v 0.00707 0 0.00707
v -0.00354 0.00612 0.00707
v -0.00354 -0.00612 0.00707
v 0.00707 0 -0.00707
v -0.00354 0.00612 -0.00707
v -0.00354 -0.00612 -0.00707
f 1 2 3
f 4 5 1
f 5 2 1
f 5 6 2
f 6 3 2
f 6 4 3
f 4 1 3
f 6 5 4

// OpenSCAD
// file: ../scad/params.scad
// ===== Smart lock enclosure parameters (mm) =====

// --- Print / fit ---
wall          = 2.4;
fit_clearance = 0.4;
$fn           = 64;

// --- SG90 servo (datasheet nominal) ---
servo_body_l  = 22.8;
servo_body_w  = 12.2;
servo_body_h  = 22.5;
servo_tab_l   = 32.2;   // length across mounting tabs
servo_tab_h   = 2.5;
servo_shaft_d = 4.8;    // output boss / horn clearance
servo_screw_d = 2.0;

// --- Raspberry Pi Pico W ---
pico_l        = 51.0;
pico_w        = 21.0;
pico_h        = 1.0;
pico_hole_d   = 2.1;
pico_hole_dx  = 47.0;   // mounting hole spacing along length
pico_hole_dy  = 11.4;   // mounting hole spacing across width
pico_boss_d   = 4.5;
pico_boss_h   = 3.0;

// --- USB micro-B plug clearance (Pico W) ---
usb_w         = 9.0;
usb_h         = 6.0;

// --- Indicators ---
led_hole_d    = 5.2;
button_hole_d = 6.2;

// --- MOSFET footprint (small module) ---
mosfet_w      = 12.0;
mosfet_l      = 16.0;

// --- Thumb-turn knob: PLACEHOLDER — measure real part, then set ---
knob_w        = 8.0;
knob_t        = 4.0;
knob_h        = 12.0;
socket_wall   = 2.0;

// --- Derived enclosure dimensions ---
inner_l = max(servo_tab_l, pico_l) + 6;
inner_w = servo_body_w + pico_w + 8;
inner_h = servo_body_h + pico_boss_h + 6;

body_l = inner_l + 2*wall;
body_w = inner_w + 2*wall;
body_h = inner_h + 2*wall;

// --- Sanity checks ---
assert(wall > 0, "wall must be positive");
assert(fit_clearance >= 0, "fit_clearance must be >= 0");
assert(inner_l >= pico_l, "body too short for Pico");
assert(inner_h >= servo_body_h, "body too short for servo");
// main file
include <../scad/params.scad>
// Derived body must enclose the largest component footprints.
assert(body_l >= pico_l + 2*wall, "body length must enclose Pico");
assert(body_h >= servo_body_h + 2*wall, "body height must enclose servo");
assert(fit_clearance >= 0, "clearance non-negative");
echo("params_test ok");

// Render a minimal object to satisfy OpenSCAD's requirement
sphere(0.01, $fn=3);
